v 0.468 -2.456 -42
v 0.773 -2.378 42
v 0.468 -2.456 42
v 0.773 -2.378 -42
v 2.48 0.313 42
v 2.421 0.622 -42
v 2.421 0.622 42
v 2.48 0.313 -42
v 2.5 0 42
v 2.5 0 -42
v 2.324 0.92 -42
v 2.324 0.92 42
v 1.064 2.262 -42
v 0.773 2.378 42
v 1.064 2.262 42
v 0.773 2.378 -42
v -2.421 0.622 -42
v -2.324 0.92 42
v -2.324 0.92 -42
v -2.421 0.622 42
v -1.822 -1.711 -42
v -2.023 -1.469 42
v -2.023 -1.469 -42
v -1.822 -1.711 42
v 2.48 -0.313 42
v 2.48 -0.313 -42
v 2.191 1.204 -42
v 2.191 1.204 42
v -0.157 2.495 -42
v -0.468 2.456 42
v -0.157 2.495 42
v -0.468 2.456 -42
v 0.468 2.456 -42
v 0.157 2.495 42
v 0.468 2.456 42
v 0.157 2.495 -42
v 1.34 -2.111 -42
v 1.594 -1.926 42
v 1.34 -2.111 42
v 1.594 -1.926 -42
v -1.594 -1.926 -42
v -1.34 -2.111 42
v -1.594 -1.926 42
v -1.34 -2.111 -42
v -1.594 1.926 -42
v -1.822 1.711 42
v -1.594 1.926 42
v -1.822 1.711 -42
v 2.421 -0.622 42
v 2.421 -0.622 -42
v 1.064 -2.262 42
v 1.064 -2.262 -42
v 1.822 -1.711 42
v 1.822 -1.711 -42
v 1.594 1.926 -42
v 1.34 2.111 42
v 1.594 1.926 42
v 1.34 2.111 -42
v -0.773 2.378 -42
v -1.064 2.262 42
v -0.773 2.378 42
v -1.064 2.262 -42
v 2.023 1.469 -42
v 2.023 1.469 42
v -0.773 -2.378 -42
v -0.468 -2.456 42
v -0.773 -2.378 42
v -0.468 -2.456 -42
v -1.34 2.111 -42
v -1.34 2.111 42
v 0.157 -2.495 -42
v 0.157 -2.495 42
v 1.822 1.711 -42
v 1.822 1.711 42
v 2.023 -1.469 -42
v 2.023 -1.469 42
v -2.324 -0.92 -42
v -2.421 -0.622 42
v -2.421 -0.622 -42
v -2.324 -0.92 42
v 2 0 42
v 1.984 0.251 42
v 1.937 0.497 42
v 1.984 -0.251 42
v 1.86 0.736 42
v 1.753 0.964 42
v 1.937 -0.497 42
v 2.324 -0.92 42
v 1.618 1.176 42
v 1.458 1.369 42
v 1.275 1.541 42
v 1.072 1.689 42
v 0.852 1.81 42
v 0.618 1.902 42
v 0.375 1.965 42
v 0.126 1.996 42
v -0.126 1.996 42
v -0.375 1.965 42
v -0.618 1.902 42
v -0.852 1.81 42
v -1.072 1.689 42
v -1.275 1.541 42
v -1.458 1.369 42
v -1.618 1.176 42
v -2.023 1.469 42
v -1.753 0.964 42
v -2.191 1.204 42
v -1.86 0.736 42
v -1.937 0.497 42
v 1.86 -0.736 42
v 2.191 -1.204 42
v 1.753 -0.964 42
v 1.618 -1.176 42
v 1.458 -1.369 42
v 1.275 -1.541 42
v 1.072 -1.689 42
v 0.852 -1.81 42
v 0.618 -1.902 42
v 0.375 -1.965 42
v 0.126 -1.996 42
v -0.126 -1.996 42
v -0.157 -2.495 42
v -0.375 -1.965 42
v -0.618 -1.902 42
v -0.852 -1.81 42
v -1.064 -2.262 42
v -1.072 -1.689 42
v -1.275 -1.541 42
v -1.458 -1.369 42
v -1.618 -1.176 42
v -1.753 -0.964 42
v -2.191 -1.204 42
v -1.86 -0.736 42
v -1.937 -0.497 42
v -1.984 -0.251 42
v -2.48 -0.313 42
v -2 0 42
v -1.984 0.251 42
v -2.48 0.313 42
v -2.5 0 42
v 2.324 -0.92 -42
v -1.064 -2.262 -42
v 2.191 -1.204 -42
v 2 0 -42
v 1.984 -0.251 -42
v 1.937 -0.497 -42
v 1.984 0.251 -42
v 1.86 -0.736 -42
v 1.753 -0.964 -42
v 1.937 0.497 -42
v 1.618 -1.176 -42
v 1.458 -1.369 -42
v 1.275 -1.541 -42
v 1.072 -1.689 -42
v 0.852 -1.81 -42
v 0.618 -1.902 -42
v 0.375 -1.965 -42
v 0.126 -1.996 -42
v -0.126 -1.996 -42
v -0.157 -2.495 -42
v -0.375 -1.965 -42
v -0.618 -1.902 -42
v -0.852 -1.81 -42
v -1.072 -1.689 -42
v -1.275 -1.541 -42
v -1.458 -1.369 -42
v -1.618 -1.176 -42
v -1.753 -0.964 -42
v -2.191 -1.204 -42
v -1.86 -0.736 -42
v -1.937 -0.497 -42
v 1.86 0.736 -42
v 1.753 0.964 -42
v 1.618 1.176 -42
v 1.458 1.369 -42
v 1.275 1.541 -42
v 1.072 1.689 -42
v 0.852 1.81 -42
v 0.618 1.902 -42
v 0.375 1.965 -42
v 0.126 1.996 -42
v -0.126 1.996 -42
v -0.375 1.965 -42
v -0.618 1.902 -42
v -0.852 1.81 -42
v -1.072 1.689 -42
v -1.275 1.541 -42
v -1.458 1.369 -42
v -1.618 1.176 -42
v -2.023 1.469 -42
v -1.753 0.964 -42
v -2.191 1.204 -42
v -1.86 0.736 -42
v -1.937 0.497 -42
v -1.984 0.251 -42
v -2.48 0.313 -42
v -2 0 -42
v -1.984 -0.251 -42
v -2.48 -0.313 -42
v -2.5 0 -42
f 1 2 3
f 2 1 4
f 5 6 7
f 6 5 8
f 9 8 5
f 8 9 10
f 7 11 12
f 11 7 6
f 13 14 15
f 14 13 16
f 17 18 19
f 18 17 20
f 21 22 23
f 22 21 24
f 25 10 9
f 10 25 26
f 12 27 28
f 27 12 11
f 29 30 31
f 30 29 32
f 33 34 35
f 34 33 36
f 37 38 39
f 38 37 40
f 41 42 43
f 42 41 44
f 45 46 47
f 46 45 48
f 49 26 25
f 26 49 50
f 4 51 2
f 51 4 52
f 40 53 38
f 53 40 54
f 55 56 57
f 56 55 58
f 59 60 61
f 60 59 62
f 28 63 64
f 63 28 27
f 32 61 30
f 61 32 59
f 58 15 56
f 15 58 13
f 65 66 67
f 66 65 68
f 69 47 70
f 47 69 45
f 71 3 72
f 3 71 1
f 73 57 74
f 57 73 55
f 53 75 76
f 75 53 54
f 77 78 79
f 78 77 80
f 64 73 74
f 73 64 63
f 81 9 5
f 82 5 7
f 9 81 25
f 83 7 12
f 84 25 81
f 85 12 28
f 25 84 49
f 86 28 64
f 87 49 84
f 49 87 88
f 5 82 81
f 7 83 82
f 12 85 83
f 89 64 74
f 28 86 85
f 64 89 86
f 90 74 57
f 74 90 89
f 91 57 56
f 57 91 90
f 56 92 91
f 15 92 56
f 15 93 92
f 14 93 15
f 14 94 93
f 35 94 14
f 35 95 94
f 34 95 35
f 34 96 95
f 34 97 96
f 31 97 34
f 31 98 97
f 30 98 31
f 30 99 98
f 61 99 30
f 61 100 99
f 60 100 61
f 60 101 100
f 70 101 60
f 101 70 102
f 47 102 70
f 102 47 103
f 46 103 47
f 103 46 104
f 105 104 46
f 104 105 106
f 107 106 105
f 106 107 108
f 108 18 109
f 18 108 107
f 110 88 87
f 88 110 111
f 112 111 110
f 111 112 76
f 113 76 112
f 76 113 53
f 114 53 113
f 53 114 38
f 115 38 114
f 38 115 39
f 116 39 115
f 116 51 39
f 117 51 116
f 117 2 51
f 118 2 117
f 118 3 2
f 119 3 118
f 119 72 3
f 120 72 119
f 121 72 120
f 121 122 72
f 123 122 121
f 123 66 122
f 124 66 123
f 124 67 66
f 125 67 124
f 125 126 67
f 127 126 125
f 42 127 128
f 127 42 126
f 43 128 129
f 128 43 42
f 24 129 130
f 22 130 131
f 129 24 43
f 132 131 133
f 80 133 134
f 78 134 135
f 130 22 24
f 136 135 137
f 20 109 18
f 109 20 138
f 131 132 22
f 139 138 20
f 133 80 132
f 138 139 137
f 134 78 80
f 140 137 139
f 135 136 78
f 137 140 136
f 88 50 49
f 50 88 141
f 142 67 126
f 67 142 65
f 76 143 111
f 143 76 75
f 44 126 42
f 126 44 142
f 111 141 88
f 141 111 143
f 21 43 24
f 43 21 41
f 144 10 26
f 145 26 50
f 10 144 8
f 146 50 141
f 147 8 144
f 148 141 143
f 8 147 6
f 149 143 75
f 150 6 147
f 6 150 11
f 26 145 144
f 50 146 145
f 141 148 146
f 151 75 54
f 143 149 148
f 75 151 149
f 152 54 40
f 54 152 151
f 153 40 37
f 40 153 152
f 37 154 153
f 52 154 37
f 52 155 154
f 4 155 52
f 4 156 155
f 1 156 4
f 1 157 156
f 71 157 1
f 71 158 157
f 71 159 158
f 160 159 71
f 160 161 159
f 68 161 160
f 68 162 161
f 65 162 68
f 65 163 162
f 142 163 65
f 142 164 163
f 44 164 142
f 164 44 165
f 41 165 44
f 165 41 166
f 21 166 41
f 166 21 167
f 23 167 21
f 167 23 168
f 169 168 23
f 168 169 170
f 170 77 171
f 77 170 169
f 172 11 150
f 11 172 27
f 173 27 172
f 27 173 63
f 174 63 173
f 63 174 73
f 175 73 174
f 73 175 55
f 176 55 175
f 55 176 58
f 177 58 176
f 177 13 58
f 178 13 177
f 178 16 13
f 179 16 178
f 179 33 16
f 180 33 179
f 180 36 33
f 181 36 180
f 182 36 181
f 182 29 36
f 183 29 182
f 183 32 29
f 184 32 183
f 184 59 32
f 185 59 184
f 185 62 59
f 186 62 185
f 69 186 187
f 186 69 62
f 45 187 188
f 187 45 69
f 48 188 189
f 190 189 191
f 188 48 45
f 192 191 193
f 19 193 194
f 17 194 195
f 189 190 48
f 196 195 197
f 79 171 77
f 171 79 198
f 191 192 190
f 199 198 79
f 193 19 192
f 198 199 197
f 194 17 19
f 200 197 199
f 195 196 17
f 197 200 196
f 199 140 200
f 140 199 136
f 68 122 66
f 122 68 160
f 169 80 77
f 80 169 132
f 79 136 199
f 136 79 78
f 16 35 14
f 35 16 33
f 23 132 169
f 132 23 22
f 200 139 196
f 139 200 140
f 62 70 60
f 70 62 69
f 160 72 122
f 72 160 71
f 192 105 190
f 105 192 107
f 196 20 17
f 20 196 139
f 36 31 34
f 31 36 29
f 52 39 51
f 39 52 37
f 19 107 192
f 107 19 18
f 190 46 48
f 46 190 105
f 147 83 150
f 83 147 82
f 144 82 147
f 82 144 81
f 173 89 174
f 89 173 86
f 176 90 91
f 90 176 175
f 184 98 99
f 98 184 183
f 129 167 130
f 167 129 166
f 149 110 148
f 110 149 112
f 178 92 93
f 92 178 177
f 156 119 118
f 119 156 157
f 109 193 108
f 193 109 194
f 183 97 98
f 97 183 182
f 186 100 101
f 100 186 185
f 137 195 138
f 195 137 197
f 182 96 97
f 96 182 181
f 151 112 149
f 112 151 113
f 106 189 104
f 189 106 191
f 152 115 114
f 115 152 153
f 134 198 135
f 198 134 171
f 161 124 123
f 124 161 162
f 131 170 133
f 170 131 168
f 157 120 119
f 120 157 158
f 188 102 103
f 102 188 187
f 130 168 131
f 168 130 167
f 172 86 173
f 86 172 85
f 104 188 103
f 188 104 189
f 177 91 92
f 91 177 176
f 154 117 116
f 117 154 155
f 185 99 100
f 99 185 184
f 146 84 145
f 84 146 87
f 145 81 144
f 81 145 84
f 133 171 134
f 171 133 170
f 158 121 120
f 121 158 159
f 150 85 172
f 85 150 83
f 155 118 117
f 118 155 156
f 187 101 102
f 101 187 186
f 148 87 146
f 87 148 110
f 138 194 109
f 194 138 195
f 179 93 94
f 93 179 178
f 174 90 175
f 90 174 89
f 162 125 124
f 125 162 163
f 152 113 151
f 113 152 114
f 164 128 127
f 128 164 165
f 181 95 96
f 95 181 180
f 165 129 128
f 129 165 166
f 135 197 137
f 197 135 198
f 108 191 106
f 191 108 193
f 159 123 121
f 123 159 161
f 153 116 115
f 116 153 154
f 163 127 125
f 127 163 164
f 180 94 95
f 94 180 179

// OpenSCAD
$fn = 50;


difference() {
	union() {
		translate(v = [0, 0, -42.0000000000]) {
			cylinder(h = 84, r = 2.5000000000);
		}
	}
	union() {
		translate(v = [0, 0, -100.0000000000]) {
			cylinder(h = 200, r = 2.0000000000);
		}
	}
}
